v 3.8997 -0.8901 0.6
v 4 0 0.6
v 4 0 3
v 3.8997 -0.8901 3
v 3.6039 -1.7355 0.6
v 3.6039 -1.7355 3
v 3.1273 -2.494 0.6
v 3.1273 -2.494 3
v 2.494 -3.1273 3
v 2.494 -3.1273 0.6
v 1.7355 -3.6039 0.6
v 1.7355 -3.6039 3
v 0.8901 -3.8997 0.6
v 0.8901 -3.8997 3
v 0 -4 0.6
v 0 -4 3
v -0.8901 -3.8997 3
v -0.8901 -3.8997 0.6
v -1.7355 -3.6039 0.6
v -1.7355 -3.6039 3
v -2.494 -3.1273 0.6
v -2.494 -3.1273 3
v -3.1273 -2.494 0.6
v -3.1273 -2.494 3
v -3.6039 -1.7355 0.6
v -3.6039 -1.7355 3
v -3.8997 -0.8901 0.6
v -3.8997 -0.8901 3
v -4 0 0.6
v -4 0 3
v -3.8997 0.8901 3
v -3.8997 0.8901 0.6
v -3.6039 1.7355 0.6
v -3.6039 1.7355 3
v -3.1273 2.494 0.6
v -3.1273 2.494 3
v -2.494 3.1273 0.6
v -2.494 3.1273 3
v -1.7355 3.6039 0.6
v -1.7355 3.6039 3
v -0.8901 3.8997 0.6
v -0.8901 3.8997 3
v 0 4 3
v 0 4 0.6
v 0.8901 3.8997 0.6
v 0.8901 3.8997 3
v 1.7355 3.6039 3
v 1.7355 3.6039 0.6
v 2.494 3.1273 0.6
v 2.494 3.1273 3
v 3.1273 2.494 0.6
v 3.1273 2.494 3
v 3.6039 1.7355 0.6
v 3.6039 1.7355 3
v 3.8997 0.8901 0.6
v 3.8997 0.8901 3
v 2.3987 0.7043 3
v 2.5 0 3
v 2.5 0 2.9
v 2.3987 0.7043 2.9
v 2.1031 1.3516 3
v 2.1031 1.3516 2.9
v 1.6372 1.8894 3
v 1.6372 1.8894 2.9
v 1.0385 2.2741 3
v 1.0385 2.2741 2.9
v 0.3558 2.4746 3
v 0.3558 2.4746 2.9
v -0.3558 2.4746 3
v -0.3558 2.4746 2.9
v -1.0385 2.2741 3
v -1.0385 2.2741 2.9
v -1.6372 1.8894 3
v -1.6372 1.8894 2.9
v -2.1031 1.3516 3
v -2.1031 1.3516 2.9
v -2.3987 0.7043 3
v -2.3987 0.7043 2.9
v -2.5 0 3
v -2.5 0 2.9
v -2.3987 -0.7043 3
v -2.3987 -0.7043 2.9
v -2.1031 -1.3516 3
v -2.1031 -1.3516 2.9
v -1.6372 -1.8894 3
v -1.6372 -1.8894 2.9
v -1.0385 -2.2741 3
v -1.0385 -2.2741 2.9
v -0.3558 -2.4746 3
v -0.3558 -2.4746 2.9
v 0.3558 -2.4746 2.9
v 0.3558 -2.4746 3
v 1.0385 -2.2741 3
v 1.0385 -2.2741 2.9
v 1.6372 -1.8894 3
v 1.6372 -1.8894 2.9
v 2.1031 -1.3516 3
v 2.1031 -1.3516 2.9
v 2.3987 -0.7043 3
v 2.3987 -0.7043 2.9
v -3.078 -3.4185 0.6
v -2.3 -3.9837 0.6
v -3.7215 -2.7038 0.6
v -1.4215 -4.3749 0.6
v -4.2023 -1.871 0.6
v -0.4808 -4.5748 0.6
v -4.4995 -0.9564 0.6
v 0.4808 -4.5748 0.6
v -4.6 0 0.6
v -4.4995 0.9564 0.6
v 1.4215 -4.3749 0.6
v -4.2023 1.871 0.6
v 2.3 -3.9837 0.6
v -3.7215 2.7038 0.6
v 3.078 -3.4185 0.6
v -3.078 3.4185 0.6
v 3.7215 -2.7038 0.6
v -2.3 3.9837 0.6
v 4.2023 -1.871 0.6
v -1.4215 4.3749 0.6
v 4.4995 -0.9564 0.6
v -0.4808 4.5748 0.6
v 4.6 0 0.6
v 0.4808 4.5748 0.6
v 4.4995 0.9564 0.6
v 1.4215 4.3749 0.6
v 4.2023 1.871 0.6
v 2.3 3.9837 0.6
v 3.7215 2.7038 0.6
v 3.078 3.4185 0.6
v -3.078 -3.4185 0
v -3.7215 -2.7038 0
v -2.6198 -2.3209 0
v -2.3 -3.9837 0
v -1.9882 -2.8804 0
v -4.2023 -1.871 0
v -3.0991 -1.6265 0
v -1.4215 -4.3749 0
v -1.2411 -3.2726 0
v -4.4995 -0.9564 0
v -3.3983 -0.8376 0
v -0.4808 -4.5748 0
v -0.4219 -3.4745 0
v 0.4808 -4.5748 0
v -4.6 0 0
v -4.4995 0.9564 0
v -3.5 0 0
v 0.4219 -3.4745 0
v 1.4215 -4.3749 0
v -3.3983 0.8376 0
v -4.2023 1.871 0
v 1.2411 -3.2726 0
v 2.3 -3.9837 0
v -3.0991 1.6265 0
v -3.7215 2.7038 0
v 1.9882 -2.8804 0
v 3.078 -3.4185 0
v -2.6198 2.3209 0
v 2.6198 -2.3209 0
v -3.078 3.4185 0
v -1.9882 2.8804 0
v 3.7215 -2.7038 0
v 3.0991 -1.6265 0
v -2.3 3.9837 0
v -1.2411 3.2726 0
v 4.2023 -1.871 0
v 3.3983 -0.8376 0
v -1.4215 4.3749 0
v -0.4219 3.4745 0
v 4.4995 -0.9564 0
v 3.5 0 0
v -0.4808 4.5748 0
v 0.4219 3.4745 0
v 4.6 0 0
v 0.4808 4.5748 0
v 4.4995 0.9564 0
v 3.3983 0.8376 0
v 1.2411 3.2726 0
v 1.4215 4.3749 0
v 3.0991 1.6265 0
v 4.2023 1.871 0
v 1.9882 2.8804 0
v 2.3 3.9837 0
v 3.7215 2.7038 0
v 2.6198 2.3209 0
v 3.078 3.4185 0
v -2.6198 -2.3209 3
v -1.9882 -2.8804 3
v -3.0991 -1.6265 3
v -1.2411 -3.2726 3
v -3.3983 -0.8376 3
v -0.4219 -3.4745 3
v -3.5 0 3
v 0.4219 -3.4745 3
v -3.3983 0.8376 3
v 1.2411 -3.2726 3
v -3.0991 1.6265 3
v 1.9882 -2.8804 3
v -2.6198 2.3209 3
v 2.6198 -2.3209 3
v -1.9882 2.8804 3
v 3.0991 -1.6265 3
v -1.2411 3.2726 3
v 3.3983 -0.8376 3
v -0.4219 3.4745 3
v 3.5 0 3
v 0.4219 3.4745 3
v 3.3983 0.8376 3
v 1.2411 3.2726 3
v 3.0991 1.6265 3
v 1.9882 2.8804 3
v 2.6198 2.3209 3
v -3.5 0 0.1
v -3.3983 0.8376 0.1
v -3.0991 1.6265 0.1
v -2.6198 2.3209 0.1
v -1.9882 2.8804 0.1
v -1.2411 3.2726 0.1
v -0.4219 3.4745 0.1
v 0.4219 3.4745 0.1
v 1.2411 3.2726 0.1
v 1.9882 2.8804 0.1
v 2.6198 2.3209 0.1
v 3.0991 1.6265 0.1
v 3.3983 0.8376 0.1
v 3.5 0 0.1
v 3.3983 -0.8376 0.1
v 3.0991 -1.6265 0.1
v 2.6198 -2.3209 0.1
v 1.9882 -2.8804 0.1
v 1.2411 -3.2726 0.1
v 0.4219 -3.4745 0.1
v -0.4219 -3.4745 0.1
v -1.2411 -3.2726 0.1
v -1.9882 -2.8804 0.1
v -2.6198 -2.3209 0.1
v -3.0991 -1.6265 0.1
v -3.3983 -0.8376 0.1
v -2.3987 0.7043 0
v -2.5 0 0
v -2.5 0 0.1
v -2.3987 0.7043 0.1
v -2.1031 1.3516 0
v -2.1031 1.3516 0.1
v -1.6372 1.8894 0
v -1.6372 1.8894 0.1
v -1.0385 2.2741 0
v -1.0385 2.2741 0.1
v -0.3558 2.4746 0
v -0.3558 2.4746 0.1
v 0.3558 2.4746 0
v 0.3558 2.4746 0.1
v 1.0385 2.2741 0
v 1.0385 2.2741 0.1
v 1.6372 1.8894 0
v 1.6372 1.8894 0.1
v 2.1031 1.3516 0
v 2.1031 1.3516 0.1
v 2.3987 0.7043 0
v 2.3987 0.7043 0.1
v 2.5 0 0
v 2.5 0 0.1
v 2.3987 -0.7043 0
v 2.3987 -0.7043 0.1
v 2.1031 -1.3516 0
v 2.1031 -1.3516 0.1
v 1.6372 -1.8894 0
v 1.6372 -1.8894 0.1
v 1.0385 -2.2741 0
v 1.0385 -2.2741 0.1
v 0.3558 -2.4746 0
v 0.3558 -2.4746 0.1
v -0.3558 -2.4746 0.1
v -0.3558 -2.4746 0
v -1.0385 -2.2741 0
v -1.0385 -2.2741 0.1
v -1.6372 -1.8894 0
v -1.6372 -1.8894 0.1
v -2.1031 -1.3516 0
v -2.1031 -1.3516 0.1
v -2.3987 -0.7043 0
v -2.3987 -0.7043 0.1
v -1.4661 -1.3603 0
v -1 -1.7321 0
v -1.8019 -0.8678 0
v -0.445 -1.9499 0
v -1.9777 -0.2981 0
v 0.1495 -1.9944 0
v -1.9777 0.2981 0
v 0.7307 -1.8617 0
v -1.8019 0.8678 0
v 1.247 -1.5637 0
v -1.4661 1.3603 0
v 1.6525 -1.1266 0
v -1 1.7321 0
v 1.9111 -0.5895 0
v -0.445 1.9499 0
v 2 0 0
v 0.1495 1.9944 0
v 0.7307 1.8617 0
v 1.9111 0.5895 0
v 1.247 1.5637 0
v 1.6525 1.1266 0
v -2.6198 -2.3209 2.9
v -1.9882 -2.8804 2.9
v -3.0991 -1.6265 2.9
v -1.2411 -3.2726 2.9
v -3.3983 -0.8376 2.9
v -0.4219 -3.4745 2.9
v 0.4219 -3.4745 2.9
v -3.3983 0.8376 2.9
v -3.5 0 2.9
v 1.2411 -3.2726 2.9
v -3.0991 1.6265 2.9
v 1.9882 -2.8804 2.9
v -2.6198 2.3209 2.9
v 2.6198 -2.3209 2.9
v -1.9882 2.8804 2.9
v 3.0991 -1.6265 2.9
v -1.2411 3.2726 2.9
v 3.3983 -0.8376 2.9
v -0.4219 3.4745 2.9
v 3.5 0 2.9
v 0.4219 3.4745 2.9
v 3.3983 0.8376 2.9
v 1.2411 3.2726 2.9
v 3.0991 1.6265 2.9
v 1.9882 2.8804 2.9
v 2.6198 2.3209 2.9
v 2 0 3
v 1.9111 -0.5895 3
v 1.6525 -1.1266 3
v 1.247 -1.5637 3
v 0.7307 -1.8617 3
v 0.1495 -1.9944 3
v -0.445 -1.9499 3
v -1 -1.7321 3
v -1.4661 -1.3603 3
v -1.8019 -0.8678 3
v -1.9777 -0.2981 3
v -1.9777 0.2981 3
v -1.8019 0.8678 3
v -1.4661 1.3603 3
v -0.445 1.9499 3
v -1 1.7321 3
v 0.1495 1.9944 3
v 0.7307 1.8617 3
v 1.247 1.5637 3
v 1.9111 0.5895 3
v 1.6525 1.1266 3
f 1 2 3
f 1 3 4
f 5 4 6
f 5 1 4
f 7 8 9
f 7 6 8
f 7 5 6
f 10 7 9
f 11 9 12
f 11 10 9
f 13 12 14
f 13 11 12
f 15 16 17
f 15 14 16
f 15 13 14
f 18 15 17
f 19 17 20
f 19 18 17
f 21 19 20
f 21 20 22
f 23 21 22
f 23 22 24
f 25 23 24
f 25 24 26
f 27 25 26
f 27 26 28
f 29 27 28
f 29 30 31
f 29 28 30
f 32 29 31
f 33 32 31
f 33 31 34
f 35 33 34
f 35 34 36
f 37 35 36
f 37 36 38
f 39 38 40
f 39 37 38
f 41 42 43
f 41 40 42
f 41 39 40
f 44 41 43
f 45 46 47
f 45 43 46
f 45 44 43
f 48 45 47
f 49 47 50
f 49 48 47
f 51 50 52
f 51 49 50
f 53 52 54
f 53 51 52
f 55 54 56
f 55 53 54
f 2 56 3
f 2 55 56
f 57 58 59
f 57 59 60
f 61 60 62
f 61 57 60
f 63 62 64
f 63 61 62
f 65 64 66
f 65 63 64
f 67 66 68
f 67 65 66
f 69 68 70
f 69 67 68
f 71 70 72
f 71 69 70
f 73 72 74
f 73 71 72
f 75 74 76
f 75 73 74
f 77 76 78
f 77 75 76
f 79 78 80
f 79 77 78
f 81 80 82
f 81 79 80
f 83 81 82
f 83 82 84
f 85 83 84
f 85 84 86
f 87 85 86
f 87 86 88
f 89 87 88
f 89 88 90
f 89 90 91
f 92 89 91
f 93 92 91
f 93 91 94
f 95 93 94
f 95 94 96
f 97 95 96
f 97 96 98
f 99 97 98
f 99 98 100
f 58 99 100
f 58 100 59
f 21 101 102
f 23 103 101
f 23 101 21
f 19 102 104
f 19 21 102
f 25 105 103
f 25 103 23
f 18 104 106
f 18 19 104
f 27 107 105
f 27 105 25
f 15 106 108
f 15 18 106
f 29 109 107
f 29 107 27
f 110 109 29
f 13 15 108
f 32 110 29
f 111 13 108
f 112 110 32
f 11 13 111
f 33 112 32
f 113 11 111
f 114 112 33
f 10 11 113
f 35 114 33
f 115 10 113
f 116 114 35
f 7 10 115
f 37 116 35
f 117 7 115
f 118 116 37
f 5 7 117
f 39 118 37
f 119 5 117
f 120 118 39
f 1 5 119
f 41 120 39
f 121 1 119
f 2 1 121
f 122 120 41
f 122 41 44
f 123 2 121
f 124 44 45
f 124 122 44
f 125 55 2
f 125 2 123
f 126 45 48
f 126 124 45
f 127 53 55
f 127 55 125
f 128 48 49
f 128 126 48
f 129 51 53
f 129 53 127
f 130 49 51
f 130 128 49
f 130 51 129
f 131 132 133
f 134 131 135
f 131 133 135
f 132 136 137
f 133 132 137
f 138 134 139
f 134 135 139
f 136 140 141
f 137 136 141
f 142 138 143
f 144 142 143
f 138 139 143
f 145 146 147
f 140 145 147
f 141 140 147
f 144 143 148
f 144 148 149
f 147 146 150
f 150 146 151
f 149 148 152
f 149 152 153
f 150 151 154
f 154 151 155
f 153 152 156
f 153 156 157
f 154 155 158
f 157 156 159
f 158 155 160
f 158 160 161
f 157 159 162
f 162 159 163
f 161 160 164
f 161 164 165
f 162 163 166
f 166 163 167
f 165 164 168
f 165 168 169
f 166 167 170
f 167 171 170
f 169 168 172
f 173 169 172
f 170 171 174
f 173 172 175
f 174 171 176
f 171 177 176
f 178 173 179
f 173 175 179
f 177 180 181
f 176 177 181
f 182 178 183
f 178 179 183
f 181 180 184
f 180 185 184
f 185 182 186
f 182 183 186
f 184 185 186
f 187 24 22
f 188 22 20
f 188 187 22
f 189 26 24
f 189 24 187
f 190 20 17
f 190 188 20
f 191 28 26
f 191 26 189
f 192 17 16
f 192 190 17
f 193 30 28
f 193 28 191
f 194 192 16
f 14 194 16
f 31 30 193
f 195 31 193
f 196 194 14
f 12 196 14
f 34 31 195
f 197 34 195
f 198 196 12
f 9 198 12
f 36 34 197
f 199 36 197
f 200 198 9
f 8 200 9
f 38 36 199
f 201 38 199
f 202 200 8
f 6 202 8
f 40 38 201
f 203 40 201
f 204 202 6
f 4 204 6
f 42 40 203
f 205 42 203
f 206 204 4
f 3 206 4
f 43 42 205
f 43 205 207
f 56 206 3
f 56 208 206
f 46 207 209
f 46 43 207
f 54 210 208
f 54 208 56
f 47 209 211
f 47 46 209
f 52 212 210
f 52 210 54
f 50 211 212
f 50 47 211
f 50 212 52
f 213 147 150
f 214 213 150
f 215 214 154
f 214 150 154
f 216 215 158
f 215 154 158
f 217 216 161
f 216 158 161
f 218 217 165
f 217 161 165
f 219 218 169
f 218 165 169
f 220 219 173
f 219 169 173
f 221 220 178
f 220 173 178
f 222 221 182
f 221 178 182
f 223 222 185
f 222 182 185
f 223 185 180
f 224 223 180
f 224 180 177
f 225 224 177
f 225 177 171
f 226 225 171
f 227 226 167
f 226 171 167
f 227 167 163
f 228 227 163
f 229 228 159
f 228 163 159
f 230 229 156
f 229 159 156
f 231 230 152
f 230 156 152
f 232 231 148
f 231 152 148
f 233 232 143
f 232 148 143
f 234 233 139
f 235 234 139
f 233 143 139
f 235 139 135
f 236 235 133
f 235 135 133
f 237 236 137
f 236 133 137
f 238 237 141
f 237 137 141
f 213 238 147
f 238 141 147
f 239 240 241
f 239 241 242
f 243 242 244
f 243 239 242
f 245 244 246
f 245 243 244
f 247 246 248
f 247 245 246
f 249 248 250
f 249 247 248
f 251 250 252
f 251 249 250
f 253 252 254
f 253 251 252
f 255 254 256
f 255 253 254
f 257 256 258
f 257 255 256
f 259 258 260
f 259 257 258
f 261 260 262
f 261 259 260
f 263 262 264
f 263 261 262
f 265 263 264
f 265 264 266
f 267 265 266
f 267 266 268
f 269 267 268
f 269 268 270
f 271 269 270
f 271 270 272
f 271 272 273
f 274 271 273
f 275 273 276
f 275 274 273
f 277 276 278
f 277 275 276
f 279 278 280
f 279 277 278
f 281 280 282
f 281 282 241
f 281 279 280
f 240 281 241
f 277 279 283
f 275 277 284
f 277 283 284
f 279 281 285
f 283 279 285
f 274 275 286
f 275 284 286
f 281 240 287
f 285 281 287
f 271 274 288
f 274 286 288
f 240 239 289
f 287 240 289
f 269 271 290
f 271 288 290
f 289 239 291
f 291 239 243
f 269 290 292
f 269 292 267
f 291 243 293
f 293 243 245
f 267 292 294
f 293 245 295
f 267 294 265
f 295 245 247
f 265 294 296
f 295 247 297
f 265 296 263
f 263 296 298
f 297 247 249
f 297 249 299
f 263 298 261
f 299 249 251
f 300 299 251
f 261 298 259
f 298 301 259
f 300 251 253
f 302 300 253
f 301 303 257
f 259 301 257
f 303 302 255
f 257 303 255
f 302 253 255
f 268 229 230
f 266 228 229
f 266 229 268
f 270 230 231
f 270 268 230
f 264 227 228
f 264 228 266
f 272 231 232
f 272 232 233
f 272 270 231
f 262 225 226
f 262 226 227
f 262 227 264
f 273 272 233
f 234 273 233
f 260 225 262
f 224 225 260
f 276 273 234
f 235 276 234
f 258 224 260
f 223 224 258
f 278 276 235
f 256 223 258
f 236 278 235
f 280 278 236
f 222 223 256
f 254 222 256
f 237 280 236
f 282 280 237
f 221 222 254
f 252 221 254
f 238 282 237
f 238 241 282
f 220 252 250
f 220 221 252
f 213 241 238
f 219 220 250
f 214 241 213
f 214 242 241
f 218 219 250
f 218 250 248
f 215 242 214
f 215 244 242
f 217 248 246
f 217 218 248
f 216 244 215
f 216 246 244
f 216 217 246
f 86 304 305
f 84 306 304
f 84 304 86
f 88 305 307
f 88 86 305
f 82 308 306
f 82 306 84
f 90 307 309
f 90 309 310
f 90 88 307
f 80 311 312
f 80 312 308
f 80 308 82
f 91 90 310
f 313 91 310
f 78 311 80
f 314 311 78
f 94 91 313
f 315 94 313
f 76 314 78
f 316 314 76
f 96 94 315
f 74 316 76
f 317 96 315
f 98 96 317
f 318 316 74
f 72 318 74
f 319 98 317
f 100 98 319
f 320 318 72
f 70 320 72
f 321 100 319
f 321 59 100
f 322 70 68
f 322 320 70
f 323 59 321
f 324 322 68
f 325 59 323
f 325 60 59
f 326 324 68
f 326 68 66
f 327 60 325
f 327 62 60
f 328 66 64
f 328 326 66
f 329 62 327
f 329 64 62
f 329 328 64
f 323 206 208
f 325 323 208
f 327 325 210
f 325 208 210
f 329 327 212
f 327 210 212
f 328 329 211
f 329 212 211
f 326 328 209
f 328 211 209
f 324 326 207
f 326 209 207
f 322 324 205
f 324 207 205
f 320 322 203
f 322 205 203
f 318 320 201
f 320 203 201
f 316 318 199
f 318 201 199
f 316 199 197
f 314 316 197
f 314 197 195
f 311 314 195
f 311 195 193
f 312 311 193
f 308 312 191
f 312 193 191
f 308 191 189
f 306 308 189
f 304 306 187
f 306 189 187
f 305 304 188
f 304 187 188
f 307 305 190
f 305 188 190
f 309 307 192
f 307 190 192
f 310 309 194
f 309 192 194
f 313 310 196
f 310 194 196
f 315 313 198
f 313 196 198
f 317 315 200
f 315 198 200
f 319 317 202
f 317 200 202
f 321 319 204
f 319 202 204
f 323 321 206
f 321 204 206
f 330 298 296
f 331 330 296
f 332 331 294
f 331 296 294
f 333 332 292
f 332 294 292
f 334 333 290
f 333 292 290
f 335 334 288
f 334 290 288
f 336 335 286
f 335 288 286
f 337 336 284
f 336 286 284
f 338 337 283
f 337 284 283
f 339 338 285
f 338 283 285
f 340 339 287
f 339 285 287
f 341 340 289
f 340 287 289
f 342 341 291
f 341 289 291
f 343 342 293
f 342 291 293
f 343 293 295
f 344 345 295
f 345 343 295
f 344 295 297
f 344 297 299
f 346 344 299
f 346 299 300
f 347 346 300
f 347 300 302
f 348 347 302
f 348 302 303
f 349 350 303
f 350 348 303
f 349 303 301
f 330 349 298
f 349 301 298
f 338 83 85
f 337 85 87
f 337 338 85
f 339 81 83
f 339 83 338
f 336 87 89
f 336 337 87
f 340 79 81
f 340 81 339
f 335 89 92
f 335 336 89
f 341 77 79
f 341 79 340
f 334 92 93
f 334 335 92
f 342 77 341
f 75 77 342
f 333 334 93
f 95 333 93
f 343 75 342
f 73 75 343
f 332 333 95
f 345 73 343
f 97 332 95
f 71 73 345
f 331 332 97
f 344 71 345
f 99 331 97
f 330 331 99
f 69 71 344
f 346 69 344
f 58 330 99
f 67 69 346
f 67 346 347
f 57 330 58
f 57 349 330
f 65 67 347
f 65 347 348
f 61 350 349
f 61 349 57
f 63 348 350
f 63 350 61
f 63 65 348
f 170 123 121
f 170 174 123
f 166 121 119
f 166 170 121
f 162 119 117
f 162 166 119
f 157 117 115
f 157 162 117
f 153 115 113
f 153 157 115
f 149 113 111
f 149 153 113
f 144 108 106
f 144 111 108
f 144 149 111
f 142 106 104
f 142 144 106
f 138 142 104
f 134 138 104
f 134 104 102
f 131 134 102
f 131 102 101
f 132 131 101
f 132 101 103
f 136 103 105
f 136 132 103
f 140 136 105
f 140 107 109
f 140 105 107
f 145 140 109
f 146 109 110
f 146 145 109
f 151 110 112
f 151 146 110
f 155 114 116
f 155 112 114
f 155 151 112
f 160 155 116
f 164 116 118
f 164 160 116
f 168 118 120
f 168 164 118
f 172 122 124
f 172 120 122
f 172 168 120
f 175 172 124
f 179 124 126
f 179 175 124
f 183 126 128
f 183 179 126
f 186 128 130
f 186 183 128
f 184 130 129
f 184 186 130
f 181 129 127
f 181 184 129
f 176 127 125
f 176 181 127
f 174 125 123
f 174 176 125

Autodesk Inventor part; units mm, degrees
ref_plane "YZ Plane" through (0, 0, 0) normal (1, 0, 0) x (0, 1, 0)
ref_plane "XZ Plane" through (0, 0, 0) normal (0, 1, 0) x (-1, 0, 0)
ref_plane "XY Plane" through (0, 0, 0) normal (0, 0, 1) x (1, 0, 0)
sketch "スケッチ1" plane through (0, 0, 0) normal (0, 0, 1) x (1, 0, 0)
  circle A0 centre (0, 0) radius 2
  circle A1 centre (0, 0) radius 4
  circle A2 centre (0, 0) radius 4.6
  dimension "d0" = 4
  dimension "d1" = 8
  dimension "d2" = 0.6
extrude "押し出し1" add sketch "スケッチ1" along normal blind 3 contours A1
extrude "押し出し2" add sketch "スケッチ1" along normal blind 0.6 contours A2
sketch "スケッチ2" plane through (0, 0, 0) normal (0, 0, -1) x (-1, 0, 0)
  circle A0 centre (0, 0) radius 2.5
  circle A1 centre (0, 0) radius 3.5
  dimension "d7" = 5
  dimension "d8" = 7
extrude "押し出し3" cut sketch "スケッチ2" against normal blind 0.1
sketch "スケッチ3" plane through (0, 0, 3) normal (0, 0, 1) x (1, 0, 0)
  circle A0 centre (0, 0) radius 2.5
  circle A1 centre (0, 0) radius 3.5
  dimension "d11" = 5
  dimension "d12" = 7
extrude "押し出し4" cut sketch "スケッチ3" against normal blind 0.1
properties part number "ベアリングd4D8B3F" material "鋼、炭素鋼"
